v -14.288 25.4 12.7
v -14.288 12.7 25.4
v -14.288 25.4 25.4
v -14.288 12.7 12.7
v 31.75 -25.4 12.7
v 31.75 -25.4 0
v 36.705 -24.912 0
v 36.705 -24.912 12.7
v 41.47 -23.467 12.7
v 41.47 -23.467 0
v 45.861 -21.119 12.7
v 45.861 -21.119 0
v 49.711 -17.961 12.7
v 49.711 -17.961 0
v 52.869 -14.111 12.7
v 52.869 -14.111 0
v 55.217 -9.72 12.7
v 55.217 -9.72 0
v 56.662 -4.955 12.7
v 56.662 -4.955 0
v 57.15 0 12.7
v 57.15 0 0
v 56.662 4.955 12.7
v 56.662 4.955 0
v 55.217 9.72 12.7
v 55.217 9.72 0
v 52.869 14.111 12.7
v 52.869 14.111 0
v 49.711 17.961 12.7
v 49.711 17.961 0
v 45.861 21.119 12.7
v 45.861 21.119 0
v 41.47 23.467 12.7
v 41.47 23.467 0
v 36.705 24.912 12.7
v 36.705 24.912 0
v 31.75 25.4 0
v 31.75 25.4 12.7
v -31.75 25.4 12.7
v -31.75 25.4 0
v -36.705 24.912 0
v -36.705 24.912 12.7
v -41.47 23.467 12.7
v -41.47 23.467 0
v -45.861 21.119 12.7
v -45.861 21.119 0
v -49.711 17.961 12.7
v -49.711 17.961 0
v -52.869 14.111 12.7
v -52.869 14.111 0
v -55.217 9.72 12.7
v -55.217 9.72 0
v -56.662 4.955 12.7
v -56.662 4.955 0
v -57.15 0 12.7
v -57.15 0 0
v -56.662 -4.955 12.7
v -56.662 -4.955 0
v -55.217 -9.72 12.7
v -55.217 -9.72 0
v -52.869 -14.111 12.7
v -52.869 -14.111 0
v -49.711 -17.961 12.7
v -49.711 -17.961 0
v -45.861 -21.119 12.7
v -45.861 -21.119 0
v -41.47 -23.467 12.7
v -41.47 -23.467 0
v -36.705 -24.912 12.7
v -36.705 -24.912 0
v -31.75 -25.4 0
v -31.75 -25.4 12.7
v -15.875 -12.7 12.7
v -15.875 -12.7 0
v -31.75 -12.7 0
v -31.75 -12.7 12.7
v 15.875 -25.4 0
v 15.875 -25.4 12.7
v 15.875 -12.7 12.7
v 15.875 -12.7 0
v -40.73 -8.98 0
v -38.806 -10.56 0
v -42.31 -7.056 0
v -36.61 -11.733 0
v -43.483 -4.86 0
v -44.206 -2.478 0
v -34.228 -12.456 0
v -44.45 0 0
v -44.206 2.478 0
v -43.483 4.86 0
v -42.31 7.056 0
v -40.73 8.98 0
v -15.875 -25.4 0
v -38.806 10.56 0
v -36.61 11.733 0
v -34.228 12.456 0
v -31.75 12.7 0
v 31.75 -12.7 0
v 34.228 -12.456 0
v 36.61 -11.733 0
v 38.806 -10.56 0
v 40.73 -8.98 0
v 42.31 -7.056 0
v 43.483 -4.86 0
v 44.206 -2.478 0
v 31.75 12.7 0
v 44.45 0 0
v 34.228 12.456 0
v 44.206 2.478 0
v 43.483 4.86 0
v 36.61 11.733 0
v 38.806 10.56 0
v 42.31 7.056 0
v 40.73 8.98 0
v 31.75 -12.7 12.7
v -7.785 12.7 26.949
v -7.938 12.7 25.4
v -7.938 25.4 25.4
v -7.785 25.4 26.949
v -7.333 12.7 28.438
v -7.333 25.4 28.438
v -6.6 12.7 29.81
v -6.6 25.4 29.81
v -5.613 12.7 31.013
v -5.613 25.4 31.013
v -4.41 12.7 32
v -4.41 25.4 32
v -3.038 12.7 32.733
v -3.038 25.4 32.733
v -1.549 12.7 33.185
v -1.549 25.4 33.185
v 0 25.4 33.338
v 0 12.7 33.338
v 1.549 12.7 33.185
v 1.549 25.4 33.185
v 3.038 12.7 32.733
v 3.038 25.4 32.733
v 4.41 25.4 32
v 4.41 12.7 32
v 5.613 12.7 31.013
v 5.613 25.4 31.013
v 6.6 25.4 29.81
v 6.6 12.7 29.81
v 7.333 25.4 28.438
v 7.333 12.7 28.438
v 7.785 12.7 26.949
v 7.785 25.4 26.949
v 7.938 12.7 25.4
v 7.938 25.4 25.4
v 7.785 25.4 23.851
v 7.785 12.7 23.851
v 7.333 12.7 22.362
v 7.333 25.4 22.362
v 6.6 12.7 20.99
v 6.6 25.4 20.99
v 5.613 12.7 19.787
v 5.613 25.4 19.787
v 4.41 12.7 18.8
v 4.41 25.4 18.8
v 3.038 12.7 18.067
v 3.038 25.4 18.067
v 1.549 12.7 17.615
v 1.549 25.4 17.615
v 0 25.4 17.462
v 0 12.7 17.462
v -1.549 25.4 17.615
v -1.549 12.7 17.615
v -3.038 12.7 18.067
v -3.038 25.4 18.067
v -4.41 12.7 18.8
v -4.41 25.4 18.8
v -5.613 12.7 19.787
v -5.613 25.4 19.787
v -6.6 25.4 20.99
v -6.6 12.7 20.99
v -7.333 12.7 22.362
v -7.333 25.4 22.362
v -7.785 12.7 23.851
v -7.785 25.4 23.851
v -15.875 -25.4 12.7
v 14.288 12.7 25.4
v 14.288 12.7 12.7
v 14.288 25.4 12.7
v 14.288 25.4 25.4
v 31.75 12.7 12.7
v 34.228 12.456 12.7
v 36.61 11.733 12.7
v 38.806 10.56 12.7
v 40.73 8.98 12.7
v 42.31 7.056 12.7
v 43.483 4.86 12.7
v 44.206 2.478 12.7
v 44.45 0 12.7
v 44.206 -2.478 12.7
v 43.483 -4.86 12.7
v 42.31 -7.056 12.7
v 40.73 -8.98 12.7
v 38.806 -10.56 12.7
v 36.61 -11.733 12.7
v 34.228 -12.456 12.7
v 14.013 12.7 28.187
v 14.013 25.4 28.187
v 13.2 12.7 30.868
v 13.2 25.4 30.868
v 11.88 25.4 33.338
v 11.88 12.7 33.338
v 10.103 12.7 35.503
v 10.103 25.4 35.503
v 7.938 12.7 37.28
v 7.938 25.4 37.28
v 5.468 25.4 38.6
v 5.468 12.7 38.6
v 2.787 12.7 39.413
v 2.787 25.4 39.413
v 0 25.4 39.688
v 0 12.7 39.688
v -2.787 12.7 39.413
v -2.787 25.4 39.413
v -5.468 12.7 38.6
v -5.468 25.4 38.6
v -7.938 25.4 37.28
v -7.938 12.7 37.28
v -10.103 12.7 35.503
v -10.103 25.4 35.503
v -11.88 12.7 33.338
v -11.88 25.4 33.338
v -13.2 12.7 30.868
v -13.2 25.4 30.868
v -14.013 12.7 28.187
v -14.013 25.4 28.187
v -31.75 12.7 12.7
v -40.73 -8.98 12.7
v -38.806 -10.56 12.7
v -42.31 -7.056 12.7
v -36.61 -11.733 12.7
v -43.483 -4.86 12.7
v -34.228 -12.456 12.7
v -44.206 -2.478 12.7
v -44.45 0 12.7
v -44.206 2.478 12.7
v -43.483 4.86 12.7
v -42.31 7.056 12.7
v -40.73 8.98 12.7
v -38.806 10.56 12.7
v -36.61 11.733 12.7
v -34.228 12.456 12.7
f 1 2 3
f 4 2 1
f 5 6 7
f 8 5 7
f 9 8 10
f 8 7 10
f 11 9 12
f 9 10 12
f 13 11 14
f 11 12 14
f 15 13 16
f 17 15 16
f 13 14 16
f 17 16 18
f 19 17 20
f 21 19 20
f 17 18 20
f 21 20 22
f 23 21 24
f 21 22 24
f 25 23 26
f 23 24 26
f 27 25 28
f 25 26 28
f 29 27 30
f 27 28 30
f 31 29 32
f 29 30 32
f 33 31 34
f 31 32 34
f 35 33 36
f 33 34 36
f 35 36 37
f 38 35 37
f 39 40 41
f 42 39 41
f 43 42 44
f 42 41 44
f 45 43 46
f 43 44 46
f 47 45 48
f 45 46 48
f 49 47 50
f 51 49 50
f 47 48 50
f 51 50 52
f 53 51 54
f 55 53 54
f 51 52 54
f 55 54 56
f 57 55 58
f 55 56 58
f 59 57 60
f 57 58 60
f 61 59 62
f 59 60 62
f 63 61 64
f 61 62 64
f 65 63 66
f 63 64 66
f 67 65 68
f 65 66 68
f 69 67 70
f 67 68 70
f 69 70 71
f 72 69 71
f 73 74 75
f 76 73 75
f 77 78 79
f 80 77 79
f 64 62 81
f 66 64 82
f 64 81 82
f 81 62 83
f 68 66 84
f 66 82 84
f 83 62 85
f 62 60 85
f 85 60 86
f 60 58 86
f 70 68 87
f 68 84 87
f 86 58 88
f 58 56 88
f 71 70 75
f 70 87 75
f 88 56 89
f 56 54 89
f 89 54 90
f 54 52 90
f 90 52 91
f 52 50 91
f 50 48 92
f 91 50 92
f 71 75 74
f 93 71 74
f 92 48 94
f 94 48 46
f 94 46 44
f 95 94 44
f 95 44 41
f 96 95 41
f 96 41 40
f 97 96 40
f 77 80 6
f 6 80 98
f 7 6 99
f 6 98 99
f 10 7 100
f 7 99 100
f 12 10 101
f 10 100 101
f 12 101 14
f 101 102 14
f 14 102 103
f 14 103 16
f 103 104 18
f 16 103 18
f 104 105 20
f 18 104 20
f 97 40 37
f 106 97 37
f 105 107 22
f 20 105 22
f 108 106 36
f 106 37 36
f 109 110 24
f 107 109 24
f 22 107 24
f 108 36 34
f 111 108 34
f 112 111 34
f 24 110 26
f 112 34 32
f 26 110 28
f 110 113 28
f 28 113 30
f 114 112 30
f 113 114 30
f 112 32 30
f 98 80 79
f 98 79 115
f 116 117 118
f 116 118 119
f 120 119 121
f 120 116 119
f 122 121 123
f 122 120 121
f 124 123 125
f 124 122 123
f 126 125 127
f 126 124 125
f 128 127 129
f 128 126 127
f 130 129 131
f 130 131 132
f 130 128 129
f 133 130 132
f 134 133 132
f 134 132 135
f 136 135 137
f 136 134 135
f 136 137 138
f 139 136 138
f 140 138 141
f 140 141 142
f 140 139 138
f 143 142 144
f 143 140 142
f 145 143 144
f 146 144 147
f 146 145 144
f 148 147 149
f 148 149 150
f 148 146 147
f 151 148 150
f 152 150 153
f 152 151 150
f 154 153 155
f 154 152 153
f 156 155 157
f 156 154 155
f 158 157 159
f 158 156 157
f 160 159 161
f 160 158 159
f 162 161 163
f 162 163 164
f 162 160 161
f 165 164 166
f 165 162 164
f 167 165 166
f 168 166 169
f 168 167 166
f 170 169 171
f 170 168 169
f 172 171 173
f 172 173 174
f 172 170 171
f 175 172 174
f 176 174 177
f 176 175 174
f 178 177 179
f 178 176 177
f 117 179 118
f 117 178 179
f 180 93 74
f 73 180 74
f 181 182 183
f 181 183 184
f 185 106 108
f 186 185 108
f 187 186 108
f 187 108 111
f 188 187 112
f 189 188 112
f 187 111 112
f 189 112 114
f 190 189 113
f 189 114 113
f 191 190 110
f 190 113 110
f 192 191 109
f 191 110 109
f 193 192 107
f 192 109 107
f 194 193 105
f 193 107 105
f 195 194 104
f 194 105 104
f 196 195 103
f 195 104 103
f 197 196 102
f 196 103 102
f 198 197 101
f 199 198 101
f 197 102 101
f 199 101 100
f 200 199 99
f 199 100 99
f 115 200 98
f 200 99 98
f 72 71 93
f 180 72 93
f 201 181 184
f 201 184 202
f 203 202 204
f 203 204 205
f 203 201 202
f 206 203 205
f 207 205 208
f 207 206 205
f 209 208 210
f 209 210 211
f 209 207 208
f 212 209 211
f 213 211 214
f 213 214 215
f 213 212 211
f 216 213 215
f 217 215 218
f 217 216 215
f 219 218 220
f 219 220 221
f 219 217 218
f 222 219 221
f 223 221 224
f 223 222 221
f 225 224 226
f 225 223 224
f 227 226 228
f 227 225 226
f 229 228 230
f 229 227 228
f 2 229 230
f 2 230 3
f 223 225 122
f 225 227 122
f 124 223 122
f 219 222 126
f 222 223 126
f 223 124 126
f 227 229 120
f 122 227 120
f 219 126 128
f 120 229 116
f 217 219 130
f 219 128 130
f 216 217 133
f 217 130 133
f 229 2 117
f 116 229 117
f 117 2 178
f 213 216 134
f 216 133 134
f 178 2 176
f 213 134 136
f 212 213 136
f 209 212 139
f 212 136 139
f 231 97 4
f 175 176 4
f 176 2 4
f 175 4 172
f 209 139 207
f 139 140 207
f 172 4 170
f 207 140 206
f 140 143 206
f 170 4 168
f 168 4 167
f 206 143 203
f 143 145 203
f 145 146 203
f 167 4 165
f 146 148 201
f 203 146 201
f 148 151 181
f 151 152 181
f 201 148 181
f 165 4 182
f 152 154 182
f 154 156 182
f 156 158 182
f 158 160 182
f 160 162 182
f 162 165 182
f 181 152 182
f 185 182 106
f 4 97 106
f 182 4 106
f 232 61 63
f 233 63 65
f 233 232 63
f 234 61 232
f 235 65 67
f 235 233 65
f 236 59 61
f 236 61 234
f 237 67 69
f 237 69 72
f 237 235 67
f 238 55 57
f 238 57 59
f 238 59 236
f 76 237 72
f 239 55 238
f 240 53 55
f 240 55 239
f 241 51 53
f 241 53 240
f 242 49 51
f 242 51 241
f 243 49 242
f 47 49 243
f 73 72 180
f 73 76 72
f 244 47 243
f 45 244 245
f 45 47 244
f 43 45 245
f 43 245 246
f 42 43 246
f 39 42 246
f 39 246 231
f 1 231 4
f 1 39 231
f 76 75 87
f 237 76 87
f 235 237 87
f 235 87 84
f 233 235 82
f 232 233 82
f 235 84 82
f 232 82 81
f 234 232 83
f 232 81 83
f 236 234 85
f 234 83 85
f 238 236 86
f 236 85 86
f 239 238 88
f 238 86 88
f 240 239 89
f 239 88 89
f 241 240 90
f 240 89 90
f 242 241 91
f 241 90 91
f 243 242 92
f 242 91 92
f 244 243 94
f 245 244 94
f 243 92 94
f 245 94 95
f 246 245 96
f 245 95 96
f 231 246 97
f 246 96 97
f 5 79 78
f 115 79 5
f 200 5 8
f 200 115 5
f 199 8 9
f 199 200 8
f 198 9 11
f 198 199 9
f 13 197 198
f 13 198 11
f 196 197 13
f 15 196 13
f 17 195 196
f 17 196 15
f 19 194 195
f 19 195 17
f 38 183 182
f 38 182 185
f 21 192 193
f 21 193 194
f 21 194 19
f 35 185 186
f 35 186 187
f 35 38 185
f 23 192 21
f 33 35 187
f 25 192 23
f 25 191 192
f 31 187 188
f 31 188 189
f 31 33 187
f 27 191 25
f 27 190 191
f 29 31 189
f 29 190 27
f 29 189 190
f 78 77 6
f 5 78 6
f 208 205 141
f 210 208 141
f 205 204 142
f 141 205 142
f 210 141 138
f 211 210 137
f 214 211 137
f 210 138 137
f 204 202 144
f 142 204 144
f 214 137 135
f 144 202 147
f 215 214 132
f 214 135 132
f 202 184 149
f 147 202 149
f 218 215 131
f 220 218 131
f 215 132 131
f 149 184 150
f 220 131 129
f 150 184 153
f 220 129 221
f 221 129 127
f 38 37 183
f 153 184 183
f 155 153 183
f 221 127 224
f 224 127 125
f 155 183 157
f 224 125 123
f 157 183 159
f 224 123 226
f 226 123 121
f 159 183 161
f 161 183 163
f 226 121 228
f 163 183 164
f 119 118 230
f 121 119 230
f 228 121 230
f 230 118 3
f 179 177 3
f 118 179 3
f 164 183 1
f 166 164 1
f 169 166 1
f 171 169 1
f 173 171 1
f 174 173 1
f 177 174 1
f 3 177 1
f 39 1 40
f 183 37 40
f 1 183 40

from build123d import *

# Parameters (mm, degrees)
F0_W     = 15.875
F0_H     = 12.7
F1_DEPTH = 12.7
F3_DEPTH = 12.7


with BuildPart() as f1:
    # F0 (on Top) → F1 (new body)
    with BuildSketch(Plane.XY):
        with Locations((23.8125, -19.05)):
            Rectangle(F0_W, F0_H)
        with BuildLine():
            ThreePointArc((31.75, 12.7), (44.45, 0), (31.75, -12.7))
            Line((31.75, -12.7), (31.75, -25.4))
            ThreePointArc((31.75, -25.4), (57.15, 0), (31.75, 25.4))
            Line((31.75, 25.4), (0, 25.4))
            Line((0, 25.4), (-31.75, 25.4))
            ThreePointArc((-31.75, 25.4), (-57.15, 0), (-31.75, -25.4))
            Line((-31.75, -25.4), (-15.875, -25.4))
            Line((-15.875, -25.4), (-15.875, -12.7))
            Line((-15.875, -12.7), (-31.75, -12.7))
            ThreePointArc((-31.75, -12.7), (-44.45, 0), (-31.75, 12.7))
            Line((-31.75, 12.7), (0, 12.7))
            Line((0, 12.7), (31.75, 12.7))
        make_face()
    extrude(amount=F1_DEPTH)

    # F2 (on face) → F3 (join)
    with BuildSketch(Plane.XZ.offset(-12.7)):
        with BuildLine():
            Line((14.2875, 25.4), (7.9375, 25.4))
            ThreePointArc((7.9375, 25.4), (0, 17.4625), (-7.9375, 25.4))
            Line((-7.9375, 25.4), (-14.2875, 25.4))
            Line((-14.2875, 25.4), (-14.2875, 12.7))
            Line((-14.2875, 12.7), (14.2875, 12.7))
            Line((14.2875, 12.7), (14.2875, 25.4))
        make_face()
        with BuildLine():
            ThreePointArc((-7.9375, 25.4), (0, 33.3375), (7.9375, 25.4))
            Line((7.9375, 25.4), (14.2875, 25.4))
            ThreePointArc((14.2875, 25.4), (0, 39.6875), (-14.2875, 25.4))
            Line((-14.2875, 25.4), (-7.9375, 25.4))
        make_face()
    extrude(amount=-F3_DEPTH)


solid = f1.part
